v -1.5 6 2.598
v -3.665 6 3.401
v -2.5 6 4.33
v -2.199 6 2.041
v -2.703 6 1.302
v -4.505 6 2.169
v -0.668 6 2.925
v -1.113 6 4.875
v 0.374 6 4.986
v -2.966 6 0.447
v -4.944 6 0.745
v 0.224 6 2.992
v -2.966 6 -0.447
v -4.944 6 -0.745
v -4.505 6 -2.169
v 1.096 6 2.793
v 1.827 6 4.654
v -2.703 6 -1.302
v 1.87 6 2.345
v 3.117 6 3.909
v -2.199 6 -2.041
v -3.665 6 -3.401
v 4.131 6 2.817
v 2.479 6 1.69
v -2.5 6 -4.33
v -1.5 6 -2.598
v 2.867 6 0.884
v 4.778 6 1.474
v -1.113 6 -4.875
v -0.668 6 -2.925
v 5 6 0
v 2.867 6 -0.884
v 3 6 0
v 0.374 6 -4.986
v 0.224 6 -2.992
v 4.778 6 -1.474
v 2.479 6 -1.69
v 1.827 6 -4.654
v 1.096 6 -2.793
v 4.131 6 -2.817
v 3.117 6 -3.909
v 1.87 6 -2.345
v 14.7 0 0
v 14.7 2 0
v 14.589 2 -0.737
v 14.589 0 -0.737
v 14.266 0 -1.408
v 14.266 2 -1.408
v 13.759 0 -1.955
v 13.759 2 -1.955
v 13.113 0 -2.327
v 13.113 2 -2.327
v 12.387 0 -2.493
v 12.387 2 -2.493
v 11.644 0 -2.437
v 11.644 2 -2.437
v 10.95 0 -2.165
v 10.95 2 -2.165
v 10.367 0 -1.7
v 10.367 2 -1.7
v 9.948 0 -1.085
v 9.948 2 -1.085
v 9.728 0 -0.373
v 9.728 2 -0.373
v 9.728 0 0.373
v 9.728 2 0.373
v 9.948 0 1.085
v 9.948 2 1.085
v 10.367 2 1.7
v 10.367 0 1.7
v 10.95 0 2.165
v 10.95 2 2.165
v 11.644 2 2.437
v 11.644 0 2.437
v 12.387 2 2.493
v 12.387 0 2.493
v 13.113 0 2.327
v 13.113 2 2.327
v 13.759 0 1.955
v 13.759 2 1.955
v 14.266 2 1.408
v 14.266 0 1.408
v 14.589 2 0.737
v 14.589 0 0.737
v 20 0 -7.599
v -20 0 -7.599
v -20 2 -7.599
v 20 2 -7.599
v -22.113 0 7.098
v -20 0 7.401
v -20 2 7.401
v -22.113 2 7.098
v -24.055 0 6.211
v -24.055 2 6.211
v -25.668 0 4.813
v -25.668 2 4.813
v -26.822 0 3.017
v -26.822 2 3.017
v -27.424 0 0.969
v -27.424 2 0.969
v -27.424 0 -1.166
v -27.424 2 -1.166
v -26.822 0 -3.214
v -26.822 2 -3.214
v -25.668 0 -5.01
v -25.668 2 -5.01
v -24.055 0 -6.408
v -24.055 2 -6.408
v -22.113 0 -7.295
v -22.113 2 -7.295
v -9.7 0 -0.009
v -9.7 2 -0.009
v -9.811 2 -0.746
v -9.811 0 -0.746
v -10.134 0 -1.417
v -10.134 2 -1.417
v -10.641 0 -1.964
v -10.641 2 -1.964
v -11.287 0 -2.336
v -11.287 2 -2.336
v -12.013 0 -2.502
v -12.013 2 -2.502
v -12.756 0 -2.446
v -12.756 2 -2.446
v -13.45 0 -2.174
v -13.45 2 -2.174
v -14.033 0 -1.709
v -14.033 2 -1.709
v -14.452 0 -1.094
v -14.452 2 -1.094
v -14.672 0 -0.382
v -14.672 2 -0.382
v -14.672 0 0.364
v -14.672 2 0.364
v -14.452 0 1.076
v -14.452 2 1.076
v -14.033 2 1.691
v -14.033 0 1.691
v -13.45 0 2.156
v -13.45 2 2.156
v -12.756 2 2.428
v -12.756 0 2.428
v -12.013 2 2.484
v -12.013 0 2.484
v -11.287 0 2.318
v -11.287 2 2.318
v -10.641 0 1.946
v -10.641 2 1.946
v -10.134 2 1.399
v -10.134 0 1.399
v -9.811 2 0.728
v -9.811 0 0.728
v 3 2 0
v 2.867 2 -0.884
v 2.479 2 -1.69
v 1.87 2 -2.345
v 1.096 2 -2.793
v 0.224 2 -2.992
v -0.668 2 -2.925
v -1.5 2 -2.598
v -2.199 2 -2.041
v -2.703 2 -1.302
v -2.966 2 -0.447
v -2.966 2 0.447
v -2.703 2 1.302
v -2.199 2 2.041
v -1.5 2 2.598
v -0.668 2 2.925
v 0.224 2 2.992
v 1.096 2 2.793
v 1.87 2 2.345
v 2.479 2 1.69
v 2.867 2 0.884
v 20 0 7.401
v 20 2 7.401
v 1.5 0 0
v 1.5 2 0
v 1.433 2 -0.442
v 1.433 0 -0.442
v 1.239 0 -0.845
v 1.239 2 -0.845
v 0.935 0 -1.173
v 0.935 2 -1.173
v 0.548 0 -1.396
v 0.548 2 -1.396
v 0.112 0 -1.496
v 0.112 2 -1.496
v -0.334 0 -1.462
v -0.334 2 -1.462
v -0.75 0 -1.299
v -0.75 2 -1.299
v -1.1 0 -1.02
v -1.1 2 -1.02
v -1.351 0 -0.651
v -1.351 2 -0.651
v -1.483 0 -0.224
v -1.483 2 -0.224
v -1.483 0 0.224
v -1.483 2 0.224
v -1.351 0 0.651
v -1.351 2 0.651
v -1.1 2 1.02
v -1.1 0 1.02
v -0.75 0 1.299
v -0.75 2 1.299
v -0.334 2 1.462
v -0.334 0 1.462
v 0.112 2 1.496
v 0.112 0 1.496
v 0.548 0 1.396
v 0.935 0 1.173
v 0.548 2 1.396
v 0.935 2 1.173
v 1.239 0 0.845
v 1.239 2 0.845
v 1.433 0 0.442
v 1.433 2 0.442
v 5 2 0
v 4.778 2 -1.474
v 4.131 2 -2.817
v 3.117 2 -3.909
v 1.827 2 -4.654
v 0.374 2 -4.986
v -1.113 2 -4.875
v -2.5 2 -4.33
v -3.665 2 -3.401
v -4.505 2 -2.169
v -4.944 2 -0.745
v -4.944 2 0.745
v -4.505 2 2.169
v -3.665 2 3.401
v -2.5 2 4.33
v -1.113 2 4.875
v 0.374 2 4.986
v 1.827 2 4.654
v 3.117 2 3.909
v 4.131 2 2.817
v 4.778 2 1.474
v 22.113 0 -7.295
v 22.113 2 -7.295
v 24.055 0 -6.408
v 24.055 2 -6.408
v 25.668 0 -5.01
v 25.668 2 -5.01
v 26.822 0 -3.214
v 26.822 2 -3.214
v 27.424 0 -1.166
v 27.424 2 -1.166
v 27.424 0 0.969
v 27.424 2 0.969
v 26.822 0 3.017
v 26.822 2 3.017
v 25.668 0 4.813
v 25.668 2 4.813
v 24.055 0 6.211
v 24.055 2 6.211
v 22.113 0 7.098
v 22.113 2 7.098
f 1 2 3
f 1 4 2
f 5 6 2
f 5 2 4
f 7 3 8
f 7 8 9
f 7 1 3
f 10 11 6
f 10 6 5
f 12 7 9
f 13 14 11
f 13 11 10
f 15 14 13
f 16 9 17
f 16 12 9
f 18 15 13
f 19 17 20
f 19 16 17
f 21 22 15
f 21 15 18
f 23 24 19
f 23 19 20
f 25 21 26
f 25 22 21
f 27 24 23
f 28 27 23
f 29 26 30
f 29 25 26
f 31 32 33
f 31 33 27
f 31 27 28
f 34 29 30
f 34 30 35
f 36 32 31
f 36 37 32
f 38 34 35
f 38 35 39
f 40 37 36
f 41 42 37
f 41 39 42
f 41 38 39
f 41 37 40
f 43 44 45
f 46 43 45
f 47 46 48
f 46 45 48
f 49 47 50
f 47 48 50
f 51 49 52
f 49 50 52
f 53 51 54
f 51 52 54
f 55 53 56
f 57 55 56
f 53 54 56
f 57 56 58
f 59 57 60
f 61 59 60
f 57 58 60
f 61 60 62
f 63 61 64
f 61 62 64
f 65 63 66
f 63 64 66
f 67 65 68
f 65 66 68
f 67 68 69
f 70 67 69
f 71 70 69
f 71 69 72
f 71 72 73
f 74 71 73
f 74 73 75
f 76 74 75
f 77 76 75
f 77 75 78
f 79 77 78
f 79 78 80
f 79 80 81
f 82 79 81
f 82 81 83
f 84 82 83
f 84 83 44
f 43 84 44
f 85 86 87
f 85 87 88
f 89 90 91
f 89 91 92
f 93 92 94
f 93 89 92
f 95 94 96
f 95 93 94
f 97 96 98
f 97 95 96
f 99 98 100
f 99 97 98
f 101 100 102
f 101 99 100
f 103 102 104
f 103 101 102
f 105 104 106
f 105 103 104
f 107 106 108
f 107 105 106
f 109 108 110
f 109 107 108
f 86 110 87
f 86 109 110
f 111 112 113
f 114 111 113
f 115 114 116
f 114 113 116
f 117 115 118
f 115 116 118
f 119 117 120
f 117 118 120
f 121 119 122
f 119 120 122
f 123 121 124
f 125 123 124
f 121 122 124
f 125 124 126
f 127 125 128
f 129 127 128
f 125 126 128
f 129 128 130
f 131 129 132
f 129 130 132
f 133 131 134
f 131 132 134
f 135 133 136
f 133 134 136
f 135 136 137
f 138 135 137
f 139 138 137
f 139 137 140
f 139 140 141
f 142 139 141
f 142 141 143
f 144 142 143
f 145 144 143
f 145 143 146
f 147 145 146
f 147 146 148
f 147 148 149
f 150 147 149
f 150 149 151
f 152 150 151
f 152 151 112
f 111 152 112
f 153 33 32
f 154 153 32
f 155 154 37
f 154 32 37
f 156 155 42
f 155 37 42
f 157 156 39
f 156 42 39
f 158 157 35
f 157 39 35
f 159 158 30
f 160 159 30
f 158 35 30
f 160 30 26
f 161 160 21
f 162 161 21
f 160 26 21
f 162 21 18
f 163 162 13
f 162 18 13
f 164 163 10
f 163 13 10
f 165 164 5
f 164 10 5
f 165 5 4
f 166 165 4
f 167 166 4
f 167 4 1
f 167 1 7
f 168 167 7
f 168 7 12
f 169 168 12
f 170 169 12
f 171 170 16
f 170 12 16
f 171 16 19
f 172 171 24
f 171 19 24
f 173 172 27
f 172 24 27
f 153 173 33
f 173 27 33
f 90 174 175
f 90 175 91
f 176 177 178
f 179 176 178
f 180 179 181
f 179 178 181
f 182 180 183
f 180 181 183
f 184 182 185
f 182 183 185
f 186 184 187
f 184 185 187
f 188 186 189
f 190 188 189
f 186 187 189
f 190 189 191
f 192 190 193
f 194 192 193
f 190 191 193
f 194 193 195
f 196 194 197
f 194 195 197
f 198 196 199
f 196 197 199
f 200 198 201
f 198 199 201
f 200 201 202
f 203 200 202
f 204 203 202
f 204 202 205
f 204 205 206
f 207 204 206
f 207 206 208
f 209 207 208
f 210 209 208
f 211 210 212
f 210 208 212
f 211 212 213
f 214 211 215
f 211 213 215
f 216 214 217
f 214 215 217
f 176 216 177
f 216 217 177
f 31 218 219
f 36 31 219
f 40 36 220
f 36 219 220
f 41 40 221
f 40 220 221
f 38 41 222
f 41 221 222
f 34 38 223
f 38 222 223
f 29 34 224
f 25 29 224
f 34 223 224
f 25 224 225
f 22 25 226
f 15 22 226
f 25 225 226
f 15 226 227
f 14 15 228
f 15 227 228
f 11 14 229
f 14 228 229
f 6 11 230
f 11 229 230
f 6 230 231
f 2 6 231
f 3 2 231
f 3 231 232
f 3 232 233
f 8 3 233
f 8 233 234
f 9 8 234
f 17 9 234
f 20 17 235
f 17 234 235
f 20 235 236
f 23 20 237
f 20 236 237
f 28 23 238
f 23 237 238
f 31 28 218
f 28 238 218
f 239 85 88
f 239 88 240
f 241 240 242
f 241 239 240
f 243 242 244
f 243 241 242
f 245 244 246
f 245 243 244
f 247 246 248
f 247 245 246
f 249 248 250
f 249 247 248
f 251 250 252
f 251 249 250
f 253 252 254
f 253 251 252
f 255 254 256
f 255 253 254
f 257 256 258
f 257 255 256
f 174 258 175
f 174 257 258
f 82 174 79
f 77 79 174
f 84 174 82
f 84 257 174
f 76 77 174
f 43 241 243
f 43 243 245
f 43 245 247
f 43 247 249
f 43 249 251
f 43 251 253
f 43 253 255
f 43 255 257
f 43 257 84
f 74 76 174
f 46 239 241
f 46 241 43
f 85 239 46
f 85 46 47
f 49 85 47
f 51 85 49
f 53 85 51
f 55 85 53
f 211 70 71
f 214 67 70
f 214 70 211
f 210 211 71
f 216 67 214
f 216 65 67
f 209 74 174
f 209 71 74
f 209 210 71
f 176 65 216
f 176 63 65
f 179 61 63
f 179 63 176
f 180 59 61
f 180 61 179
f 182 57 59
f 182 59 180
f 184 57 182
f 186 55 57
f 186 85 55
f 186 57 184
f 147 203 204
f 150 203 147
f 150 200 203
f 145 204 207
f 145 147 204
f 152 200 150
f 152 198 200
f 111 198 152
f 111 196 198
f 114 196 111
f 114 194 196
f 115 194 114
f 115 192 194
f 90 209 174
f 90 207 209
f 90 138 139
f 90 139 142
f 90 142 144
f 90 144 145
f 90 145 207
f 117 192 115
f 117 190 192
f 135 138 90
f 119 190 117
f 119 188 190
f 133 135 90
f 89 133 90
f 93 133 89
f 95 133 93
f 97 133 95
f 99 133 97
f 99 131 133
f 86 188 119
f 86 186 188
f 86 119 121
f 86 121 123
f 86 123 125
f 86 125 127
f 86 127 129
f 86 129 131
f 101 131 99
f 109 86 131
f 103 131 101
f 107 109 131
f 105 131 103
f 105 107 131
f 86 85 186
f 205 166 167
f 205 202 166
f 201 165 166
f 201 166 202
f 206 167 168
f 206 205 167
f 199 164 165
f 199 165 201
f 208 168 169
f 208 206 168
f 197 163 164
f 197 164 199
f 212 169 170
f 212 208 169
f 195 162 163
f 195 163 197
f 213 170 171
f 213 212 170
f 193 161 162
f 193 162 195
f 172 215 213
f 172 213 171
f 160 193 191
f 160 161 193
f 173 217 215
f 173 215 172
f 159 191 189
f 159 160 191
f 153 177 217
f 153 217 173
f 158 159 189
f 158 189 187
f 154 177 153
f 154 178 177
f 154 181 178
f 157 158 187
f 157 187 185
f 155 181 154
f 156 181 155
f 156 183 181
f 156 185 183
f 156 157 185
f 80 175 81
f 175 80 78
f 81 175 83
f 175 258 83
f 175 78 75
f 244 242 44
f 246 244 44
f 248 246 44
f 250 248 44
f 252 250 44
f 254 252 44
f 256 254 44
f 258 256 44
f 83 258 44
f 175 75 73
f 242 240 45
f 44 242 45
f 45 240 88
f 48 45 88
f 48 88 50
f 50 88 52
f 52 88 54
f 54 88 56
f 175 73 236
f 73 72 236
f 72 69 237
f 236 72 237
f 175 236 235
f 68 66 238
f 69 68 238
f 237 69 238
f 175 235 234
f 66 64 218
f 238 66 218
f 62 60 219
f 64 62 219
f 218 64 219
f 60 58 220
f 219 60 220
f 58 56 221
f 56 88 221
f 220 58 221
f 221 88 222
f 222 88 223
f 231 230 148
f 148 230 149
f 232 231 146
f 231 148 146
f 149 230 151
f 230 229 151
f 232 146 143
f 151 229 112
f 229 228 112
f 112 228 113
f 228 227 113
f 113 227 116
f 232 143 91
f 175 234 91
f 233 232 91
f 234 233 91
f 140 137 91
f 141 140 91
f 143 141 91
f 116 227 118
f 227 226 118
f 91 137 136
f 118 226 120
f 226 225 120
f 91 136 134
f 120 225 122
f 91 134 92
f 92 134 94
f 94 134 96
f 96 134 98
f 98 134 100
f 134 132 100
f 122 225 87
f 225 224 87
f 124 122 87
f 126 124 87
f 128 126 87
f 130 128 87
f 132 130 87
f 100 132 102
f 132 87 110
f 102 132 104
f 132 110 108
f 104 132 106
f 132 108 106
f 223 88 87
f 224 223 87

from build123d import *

# Parameters (mm, degrees)
BOSS_EXTRUDE1_DEPTH = 2
SKETCH2_R           = 5
BOSS_EXTRUDE3_DEPTH = 4
SKETCH5_R           = 3
CUT_EXTRUDE1_DEPTH  = 4
SKETCH6_R           = 1.5
CUT_EXTRUDE2_DEPTH  = 2
SKETCH8_R           = 2.5
CUT_EXTRUDE3_DEPTH  = 3
SKETCH7_R           = 2.5
CUT_EXTRUDE4_DEPTH  = 3


with BuildPart() as part:
    # Sketch1 → Boss-Extrude1 (new body)
    with BuildSketch(Plane(origin=(0, 0, 0), x_dir=(1, 0, 0), z_dir=(0, 1, 0))):
        with BuildLine():
            Line((-20, 7.598649923), (20, 7.598649923))
            ThreePointArc((20, 7.598649923), (27.5, 0.098649923), (20, -7.401350077))
            Line((20, -7.401350077), (-20, -7.401350077))
            ThreePointArc((-20, -7.401350077), (-27.5, 0.098649923), (-20, 7.598649923))
        make_face()
    extrude(amount=BOSS_EXTRUDE1_DEPTH)

    # Sketch2 → Boss-Extrude3 (add)
    with BuildSketch(Plane(origin=(0, 2, 0), x_dir=(1, 0, 0), z_dir=(0, 1, 0))):
        Circle(SKETCH2_R)
    extrude(amount=BOSS_EXTRUDE3_DEPTH)

    # Sketch5 → Cut-Extrude1 (cut)
    with BuildSketch(Plane(origin=(0, 6, 0), x_dir=(1, 0, 0), z_dir=(0, 1, 0))):
        Circle(SKETCH5_R)
    extrude(amount=-CUT_EXTRUDE1_DEPTH, mode=Mode.SUBTRACT)

    # Sketch6 → Cut-Extrude2 (cut)
    with BuildSketch(Plane(origin=(0, 2, 0), x_dir=(1, 0, 0), z_dir=(0, 1, 0))):
        Circle(SKETCH6_R)
    extrude(amount=-CUT_EXTRUDE2_DEPTH, mode=Mode.SUBTRACT)

    # Sketch8 → Cut-Extrude3 (cut, through all)
    with BuildSketch(Plane(origin=(0, 2, 0), x_dir=(1, 0, 0), z_dir=(0, 1, 0))):
        with Locations((-12.2, 0.009046723)):
            Circle(SKETCH8_R)
    extrude(amount=-CUT_EXTRUDE3_DEPTH, mode=Mode.SUBTRACT)

    # Sketch7 → Cut-Extrude4 (cut, through all)
    with BuildSketch(Plane(origin=(0, 2, 0), x_dir=(1, 0, 0), z_dir=(0, 1, 0))):
        with Locations((12.2, 0)):
            Circle(SKETCH7_R)
    extrude(amount=-CUT_EXTRUDE4_DEPTH, mode=Mode.SUBTRACT)


solid = part.part
